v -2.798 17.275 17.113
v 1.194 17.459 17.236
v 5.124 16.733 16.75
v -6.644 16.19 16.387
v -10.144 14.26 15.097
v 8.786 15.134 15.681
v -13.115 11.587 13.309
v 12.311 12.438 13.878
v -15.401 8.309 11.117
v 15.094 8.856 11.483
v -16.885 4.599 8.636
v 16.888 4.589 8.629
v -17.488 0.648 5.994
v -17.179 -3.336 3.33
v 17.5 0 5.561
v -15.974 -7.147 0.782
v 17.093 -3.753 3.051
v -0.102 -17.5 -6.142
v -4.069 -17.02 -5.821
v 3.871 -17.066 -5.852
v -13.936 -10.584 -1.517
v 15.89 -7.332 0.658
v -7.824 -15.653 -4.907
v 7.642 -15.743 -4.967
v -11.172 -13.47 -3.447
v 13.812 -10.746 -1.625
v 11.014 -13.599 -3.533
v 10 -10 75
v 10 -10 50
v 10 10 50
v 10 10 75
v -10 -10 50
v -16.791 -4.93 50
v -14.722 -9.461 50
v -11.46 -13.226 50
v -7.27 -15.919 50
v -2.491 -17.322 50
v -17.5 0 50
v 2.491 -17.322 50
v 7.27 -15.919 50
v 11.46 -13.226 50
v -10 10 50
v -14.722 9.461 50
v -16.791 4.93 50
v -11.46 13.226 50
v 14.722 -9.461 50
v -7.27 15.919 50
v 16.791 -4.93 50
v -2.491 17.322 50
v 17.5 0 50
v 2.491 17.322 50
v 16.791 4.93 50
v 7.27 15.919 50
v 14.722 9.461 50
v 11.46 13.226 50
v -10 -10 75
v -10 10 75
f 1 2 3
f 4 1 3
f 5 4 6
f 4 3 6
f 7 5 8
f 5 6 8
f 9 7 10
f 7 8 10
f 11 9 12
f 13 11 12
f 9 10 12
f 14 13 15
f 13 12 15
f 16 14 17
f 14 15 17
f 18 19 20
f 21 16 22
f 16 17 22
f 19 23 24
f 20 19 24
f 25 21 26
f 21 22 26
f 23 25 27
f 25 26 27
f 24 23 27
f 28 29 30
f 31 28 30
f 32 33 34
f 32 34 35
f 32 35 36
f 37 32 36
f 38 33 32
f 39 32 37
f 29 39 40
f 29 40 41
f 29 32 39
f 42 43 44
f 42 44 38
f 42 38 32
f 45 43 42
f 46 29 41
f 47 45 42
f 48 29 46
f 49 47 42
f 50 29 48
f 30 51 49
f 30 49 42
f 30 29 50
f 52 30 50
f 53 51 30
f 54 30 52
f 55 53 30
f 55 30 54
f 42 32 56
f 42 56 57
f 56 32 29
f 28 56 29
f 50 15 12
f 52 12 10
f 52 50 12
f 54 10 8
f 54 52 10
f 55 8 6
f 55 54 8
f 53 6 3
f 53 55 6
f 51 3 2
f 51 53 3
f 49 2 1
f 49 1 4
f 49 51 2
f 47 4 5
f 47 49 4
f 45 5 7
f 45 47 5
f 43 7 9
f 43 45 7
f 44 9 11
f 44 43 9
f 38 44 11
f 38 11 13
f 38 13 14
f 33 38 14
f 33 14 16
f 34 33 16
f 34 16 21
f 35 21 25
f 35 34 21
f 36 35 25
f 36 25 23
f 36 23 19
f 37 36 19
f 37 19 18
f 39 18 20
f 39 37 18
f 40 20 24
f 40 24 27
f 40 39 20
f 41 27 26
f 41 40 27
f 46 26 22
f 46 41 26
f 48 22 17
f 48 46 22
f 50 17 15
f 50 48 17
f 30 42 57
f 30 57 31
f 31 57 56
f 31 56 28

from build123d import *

# Parameters (mm, degrees)
F0_R     = 17.5
F1_DEPTH = 50
F2_W     = 20
F2_H     = 20
F3_DEPTH = 25
F5_DEPTH = 25


with BuildPart() as f1:
    # F0 (on Top) → F1 (new body, symmetric)
    with BuildSketch(Plane.XY):
        Circle(F0_R)
    extrude(amount=F1_DEPTH, both=True)

    # F2 (on face) → F3 (join)
    with BuildSketch(Plane.XY.offset(50)):
        Rectangle(F2_W, F2_H)
    extrude(amount=F3_DEPTH)

    # F4 (on Right) → F5 (cut, symmetric)
    with BuildSketch(Plane.YZ):
        Polygon((41.704226, -61.003525), (28.838029, 24.845071), (-43.478873, -23.514086), (-43.478873, -61.003525), align=None)
    extrude(amount=F5_DEPTH, both=True, mode=Mode.SUBTRACT)


solid = f1.part
